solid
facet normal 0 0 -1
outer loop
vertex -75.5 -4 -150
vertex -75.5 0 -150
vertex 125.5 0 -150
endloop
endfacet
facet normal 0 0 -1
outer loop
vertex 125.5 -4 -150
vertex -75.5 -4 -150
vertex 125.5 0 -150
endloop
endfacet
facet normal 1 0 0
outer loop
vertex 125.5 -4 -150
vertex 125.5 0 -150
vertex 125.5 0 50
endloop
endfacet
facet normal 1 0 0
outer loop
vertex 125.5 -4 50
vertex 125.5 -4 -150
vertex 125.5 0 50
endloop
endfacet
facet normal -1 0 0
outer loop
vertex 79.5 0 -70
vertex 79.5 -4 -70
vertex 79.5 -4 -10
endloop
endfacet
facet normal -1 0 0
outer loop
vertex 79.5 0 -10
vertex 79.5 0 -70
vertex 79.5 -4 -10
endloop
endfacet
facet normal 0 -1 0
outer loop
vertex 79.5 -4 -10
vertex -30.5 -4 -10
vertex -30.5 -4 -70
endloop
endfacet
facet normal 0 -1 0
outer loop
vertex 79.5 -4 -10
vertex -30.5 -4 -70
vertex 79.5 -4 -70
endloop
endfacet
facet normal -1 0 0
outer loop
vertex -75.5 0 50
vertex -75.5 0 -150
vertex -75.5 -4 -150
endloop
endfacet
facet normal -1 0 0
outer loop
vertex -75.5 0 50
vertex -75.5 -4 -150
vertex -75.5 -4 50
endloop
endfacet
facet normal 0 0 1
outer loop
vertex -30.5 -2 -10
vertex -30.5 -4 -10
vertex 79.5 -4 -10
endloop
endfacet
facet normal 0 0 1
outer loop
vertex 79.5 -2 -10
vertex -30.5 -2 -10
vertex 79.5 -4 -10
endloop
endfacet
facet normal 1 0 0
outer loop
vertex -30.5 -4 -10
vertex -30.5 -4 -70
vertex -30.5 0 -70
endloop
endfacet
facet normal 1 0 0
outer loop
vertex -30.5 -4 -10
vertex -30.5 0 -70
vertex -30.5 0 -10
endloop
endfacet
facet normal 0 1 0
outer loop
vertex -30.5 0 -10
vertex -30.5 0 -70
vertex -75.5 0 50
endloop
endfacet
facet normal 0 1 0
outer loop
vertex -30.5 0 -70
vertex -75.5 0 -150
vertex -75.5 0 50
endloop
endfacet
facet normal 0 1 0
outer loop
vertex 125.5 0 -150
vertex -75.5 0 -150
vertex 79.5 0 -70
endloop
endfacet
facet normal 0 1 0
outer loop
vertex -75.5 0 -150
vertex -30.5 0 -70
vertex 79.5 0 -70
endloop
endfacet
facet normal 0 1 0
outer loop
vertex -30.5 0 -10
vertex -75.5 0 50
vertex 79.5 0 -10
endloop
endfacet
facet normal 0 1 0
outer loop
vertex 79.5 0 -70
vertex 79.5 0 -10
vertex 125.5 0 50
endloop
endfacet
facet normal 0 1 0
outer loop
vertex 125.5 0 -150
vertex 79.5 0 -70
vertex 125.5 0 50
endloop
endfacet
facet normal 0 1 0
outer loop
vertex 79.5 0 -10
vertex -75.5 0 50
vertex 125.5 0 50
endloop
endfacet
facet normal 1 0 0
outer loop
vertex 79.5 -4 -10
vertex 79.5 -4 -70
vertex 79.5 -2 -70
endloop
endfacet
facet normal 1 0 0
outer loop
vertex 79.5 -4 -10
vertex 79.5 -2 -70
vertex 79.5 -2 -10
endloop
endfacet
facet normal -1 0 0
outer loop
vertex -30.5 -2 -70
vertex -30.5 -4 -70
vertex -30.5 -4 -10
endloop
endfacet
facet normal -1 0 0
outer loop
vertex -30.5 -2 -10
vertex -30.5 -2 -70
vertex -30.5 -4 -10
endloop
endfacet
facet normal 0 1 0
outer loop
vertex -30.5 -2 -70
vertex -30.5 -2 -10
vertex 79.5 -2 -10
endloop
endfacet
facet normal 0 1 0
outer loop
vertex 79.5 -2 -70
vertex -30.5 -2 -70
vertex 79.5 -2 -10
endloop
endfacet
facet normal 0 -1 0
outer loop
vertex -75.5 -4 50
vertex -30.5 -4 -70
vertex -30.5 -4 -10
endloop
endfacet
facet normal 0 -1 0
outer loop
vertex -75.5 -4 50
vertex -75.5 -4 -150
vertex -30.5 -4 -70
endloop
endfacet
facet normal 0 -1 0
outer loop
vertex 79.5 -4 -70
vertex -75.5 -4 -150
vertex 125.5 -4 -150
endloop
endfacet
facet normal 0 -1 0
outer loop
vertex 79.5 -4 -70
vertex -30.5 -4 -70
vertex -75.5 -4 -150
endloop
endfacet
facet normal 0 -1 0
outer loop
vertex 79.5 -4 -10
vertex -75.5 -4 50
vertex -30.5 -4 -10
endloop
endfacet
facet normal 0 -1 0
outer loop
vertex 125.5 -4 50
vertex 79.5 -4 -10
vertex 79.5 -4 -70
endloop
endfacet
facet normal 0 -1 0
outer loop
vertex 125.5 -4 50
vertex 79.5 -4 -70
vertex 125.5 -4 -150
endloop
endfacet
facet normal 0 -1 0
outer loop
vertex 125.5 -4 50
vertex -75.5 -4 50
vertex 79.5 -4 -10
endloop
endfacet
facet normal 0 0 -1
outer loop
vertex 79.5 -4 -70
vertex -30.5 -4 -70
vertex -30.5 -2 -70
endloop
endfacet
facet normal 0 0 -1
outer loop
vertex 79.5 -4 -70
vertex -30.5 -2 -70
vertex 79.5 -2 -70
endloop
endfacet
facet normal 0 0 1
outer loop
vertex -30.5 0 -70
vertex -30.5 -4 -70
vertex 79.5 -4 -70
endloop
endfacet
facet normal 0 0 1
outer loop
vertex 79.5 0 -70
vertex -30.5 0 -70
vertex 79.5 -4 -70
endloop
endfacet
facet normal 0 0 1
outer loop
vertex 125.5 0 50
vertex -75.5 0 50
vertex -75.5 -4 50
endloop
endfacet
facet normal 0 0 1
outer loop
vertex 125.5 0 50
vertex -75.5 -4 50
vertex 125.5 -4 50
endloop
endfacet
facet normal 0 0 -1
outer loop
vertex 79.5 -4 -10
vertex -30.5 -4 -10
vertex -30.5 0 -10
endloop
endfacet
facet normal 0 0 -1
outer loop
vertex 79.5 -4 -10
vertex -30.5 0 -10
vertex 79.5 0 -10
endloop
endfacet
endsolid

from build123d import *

# Parameters (mm, degrees)
F0_W     = 201
F0_H     = 200
F1_DEPTH = 4
F2_W     = 110
F2_H     = 60
F3_DEPTH = 25
F4_W     = 110
F4_H     = 60
F5_DEPTH = 2


with BuildPart() as f1:
    # F0 (on Front) → F1 (new body)
    with BuildSketch(Plane.XZ):
        with Locations((25, -50)):
            Rectangle(F0_W, F0_H)
    extrude(amount=F1_DEPTH)

    # F2 (on face) → F3 (cut)
    with BuildSketch(Plane.XZ.offset(4)):
        with Locations((24.5, -40)):
            Rectangle(F2_W, F2_H)
    extrude(amount=-F3_DEPTH, mode=Mode.SUBTRACT)


with BuildPart() as f5:
    # F4 (on face) → F5 (new body)
    with BuildSketch(Plane.XZ.offset(4)):
        with Locations((24.5, -40)):
            Rectangle(F4_W, F4_H)
    extrude(amount=-F5_DEPTH)


solid = Compound([f1.part, f5.part])
